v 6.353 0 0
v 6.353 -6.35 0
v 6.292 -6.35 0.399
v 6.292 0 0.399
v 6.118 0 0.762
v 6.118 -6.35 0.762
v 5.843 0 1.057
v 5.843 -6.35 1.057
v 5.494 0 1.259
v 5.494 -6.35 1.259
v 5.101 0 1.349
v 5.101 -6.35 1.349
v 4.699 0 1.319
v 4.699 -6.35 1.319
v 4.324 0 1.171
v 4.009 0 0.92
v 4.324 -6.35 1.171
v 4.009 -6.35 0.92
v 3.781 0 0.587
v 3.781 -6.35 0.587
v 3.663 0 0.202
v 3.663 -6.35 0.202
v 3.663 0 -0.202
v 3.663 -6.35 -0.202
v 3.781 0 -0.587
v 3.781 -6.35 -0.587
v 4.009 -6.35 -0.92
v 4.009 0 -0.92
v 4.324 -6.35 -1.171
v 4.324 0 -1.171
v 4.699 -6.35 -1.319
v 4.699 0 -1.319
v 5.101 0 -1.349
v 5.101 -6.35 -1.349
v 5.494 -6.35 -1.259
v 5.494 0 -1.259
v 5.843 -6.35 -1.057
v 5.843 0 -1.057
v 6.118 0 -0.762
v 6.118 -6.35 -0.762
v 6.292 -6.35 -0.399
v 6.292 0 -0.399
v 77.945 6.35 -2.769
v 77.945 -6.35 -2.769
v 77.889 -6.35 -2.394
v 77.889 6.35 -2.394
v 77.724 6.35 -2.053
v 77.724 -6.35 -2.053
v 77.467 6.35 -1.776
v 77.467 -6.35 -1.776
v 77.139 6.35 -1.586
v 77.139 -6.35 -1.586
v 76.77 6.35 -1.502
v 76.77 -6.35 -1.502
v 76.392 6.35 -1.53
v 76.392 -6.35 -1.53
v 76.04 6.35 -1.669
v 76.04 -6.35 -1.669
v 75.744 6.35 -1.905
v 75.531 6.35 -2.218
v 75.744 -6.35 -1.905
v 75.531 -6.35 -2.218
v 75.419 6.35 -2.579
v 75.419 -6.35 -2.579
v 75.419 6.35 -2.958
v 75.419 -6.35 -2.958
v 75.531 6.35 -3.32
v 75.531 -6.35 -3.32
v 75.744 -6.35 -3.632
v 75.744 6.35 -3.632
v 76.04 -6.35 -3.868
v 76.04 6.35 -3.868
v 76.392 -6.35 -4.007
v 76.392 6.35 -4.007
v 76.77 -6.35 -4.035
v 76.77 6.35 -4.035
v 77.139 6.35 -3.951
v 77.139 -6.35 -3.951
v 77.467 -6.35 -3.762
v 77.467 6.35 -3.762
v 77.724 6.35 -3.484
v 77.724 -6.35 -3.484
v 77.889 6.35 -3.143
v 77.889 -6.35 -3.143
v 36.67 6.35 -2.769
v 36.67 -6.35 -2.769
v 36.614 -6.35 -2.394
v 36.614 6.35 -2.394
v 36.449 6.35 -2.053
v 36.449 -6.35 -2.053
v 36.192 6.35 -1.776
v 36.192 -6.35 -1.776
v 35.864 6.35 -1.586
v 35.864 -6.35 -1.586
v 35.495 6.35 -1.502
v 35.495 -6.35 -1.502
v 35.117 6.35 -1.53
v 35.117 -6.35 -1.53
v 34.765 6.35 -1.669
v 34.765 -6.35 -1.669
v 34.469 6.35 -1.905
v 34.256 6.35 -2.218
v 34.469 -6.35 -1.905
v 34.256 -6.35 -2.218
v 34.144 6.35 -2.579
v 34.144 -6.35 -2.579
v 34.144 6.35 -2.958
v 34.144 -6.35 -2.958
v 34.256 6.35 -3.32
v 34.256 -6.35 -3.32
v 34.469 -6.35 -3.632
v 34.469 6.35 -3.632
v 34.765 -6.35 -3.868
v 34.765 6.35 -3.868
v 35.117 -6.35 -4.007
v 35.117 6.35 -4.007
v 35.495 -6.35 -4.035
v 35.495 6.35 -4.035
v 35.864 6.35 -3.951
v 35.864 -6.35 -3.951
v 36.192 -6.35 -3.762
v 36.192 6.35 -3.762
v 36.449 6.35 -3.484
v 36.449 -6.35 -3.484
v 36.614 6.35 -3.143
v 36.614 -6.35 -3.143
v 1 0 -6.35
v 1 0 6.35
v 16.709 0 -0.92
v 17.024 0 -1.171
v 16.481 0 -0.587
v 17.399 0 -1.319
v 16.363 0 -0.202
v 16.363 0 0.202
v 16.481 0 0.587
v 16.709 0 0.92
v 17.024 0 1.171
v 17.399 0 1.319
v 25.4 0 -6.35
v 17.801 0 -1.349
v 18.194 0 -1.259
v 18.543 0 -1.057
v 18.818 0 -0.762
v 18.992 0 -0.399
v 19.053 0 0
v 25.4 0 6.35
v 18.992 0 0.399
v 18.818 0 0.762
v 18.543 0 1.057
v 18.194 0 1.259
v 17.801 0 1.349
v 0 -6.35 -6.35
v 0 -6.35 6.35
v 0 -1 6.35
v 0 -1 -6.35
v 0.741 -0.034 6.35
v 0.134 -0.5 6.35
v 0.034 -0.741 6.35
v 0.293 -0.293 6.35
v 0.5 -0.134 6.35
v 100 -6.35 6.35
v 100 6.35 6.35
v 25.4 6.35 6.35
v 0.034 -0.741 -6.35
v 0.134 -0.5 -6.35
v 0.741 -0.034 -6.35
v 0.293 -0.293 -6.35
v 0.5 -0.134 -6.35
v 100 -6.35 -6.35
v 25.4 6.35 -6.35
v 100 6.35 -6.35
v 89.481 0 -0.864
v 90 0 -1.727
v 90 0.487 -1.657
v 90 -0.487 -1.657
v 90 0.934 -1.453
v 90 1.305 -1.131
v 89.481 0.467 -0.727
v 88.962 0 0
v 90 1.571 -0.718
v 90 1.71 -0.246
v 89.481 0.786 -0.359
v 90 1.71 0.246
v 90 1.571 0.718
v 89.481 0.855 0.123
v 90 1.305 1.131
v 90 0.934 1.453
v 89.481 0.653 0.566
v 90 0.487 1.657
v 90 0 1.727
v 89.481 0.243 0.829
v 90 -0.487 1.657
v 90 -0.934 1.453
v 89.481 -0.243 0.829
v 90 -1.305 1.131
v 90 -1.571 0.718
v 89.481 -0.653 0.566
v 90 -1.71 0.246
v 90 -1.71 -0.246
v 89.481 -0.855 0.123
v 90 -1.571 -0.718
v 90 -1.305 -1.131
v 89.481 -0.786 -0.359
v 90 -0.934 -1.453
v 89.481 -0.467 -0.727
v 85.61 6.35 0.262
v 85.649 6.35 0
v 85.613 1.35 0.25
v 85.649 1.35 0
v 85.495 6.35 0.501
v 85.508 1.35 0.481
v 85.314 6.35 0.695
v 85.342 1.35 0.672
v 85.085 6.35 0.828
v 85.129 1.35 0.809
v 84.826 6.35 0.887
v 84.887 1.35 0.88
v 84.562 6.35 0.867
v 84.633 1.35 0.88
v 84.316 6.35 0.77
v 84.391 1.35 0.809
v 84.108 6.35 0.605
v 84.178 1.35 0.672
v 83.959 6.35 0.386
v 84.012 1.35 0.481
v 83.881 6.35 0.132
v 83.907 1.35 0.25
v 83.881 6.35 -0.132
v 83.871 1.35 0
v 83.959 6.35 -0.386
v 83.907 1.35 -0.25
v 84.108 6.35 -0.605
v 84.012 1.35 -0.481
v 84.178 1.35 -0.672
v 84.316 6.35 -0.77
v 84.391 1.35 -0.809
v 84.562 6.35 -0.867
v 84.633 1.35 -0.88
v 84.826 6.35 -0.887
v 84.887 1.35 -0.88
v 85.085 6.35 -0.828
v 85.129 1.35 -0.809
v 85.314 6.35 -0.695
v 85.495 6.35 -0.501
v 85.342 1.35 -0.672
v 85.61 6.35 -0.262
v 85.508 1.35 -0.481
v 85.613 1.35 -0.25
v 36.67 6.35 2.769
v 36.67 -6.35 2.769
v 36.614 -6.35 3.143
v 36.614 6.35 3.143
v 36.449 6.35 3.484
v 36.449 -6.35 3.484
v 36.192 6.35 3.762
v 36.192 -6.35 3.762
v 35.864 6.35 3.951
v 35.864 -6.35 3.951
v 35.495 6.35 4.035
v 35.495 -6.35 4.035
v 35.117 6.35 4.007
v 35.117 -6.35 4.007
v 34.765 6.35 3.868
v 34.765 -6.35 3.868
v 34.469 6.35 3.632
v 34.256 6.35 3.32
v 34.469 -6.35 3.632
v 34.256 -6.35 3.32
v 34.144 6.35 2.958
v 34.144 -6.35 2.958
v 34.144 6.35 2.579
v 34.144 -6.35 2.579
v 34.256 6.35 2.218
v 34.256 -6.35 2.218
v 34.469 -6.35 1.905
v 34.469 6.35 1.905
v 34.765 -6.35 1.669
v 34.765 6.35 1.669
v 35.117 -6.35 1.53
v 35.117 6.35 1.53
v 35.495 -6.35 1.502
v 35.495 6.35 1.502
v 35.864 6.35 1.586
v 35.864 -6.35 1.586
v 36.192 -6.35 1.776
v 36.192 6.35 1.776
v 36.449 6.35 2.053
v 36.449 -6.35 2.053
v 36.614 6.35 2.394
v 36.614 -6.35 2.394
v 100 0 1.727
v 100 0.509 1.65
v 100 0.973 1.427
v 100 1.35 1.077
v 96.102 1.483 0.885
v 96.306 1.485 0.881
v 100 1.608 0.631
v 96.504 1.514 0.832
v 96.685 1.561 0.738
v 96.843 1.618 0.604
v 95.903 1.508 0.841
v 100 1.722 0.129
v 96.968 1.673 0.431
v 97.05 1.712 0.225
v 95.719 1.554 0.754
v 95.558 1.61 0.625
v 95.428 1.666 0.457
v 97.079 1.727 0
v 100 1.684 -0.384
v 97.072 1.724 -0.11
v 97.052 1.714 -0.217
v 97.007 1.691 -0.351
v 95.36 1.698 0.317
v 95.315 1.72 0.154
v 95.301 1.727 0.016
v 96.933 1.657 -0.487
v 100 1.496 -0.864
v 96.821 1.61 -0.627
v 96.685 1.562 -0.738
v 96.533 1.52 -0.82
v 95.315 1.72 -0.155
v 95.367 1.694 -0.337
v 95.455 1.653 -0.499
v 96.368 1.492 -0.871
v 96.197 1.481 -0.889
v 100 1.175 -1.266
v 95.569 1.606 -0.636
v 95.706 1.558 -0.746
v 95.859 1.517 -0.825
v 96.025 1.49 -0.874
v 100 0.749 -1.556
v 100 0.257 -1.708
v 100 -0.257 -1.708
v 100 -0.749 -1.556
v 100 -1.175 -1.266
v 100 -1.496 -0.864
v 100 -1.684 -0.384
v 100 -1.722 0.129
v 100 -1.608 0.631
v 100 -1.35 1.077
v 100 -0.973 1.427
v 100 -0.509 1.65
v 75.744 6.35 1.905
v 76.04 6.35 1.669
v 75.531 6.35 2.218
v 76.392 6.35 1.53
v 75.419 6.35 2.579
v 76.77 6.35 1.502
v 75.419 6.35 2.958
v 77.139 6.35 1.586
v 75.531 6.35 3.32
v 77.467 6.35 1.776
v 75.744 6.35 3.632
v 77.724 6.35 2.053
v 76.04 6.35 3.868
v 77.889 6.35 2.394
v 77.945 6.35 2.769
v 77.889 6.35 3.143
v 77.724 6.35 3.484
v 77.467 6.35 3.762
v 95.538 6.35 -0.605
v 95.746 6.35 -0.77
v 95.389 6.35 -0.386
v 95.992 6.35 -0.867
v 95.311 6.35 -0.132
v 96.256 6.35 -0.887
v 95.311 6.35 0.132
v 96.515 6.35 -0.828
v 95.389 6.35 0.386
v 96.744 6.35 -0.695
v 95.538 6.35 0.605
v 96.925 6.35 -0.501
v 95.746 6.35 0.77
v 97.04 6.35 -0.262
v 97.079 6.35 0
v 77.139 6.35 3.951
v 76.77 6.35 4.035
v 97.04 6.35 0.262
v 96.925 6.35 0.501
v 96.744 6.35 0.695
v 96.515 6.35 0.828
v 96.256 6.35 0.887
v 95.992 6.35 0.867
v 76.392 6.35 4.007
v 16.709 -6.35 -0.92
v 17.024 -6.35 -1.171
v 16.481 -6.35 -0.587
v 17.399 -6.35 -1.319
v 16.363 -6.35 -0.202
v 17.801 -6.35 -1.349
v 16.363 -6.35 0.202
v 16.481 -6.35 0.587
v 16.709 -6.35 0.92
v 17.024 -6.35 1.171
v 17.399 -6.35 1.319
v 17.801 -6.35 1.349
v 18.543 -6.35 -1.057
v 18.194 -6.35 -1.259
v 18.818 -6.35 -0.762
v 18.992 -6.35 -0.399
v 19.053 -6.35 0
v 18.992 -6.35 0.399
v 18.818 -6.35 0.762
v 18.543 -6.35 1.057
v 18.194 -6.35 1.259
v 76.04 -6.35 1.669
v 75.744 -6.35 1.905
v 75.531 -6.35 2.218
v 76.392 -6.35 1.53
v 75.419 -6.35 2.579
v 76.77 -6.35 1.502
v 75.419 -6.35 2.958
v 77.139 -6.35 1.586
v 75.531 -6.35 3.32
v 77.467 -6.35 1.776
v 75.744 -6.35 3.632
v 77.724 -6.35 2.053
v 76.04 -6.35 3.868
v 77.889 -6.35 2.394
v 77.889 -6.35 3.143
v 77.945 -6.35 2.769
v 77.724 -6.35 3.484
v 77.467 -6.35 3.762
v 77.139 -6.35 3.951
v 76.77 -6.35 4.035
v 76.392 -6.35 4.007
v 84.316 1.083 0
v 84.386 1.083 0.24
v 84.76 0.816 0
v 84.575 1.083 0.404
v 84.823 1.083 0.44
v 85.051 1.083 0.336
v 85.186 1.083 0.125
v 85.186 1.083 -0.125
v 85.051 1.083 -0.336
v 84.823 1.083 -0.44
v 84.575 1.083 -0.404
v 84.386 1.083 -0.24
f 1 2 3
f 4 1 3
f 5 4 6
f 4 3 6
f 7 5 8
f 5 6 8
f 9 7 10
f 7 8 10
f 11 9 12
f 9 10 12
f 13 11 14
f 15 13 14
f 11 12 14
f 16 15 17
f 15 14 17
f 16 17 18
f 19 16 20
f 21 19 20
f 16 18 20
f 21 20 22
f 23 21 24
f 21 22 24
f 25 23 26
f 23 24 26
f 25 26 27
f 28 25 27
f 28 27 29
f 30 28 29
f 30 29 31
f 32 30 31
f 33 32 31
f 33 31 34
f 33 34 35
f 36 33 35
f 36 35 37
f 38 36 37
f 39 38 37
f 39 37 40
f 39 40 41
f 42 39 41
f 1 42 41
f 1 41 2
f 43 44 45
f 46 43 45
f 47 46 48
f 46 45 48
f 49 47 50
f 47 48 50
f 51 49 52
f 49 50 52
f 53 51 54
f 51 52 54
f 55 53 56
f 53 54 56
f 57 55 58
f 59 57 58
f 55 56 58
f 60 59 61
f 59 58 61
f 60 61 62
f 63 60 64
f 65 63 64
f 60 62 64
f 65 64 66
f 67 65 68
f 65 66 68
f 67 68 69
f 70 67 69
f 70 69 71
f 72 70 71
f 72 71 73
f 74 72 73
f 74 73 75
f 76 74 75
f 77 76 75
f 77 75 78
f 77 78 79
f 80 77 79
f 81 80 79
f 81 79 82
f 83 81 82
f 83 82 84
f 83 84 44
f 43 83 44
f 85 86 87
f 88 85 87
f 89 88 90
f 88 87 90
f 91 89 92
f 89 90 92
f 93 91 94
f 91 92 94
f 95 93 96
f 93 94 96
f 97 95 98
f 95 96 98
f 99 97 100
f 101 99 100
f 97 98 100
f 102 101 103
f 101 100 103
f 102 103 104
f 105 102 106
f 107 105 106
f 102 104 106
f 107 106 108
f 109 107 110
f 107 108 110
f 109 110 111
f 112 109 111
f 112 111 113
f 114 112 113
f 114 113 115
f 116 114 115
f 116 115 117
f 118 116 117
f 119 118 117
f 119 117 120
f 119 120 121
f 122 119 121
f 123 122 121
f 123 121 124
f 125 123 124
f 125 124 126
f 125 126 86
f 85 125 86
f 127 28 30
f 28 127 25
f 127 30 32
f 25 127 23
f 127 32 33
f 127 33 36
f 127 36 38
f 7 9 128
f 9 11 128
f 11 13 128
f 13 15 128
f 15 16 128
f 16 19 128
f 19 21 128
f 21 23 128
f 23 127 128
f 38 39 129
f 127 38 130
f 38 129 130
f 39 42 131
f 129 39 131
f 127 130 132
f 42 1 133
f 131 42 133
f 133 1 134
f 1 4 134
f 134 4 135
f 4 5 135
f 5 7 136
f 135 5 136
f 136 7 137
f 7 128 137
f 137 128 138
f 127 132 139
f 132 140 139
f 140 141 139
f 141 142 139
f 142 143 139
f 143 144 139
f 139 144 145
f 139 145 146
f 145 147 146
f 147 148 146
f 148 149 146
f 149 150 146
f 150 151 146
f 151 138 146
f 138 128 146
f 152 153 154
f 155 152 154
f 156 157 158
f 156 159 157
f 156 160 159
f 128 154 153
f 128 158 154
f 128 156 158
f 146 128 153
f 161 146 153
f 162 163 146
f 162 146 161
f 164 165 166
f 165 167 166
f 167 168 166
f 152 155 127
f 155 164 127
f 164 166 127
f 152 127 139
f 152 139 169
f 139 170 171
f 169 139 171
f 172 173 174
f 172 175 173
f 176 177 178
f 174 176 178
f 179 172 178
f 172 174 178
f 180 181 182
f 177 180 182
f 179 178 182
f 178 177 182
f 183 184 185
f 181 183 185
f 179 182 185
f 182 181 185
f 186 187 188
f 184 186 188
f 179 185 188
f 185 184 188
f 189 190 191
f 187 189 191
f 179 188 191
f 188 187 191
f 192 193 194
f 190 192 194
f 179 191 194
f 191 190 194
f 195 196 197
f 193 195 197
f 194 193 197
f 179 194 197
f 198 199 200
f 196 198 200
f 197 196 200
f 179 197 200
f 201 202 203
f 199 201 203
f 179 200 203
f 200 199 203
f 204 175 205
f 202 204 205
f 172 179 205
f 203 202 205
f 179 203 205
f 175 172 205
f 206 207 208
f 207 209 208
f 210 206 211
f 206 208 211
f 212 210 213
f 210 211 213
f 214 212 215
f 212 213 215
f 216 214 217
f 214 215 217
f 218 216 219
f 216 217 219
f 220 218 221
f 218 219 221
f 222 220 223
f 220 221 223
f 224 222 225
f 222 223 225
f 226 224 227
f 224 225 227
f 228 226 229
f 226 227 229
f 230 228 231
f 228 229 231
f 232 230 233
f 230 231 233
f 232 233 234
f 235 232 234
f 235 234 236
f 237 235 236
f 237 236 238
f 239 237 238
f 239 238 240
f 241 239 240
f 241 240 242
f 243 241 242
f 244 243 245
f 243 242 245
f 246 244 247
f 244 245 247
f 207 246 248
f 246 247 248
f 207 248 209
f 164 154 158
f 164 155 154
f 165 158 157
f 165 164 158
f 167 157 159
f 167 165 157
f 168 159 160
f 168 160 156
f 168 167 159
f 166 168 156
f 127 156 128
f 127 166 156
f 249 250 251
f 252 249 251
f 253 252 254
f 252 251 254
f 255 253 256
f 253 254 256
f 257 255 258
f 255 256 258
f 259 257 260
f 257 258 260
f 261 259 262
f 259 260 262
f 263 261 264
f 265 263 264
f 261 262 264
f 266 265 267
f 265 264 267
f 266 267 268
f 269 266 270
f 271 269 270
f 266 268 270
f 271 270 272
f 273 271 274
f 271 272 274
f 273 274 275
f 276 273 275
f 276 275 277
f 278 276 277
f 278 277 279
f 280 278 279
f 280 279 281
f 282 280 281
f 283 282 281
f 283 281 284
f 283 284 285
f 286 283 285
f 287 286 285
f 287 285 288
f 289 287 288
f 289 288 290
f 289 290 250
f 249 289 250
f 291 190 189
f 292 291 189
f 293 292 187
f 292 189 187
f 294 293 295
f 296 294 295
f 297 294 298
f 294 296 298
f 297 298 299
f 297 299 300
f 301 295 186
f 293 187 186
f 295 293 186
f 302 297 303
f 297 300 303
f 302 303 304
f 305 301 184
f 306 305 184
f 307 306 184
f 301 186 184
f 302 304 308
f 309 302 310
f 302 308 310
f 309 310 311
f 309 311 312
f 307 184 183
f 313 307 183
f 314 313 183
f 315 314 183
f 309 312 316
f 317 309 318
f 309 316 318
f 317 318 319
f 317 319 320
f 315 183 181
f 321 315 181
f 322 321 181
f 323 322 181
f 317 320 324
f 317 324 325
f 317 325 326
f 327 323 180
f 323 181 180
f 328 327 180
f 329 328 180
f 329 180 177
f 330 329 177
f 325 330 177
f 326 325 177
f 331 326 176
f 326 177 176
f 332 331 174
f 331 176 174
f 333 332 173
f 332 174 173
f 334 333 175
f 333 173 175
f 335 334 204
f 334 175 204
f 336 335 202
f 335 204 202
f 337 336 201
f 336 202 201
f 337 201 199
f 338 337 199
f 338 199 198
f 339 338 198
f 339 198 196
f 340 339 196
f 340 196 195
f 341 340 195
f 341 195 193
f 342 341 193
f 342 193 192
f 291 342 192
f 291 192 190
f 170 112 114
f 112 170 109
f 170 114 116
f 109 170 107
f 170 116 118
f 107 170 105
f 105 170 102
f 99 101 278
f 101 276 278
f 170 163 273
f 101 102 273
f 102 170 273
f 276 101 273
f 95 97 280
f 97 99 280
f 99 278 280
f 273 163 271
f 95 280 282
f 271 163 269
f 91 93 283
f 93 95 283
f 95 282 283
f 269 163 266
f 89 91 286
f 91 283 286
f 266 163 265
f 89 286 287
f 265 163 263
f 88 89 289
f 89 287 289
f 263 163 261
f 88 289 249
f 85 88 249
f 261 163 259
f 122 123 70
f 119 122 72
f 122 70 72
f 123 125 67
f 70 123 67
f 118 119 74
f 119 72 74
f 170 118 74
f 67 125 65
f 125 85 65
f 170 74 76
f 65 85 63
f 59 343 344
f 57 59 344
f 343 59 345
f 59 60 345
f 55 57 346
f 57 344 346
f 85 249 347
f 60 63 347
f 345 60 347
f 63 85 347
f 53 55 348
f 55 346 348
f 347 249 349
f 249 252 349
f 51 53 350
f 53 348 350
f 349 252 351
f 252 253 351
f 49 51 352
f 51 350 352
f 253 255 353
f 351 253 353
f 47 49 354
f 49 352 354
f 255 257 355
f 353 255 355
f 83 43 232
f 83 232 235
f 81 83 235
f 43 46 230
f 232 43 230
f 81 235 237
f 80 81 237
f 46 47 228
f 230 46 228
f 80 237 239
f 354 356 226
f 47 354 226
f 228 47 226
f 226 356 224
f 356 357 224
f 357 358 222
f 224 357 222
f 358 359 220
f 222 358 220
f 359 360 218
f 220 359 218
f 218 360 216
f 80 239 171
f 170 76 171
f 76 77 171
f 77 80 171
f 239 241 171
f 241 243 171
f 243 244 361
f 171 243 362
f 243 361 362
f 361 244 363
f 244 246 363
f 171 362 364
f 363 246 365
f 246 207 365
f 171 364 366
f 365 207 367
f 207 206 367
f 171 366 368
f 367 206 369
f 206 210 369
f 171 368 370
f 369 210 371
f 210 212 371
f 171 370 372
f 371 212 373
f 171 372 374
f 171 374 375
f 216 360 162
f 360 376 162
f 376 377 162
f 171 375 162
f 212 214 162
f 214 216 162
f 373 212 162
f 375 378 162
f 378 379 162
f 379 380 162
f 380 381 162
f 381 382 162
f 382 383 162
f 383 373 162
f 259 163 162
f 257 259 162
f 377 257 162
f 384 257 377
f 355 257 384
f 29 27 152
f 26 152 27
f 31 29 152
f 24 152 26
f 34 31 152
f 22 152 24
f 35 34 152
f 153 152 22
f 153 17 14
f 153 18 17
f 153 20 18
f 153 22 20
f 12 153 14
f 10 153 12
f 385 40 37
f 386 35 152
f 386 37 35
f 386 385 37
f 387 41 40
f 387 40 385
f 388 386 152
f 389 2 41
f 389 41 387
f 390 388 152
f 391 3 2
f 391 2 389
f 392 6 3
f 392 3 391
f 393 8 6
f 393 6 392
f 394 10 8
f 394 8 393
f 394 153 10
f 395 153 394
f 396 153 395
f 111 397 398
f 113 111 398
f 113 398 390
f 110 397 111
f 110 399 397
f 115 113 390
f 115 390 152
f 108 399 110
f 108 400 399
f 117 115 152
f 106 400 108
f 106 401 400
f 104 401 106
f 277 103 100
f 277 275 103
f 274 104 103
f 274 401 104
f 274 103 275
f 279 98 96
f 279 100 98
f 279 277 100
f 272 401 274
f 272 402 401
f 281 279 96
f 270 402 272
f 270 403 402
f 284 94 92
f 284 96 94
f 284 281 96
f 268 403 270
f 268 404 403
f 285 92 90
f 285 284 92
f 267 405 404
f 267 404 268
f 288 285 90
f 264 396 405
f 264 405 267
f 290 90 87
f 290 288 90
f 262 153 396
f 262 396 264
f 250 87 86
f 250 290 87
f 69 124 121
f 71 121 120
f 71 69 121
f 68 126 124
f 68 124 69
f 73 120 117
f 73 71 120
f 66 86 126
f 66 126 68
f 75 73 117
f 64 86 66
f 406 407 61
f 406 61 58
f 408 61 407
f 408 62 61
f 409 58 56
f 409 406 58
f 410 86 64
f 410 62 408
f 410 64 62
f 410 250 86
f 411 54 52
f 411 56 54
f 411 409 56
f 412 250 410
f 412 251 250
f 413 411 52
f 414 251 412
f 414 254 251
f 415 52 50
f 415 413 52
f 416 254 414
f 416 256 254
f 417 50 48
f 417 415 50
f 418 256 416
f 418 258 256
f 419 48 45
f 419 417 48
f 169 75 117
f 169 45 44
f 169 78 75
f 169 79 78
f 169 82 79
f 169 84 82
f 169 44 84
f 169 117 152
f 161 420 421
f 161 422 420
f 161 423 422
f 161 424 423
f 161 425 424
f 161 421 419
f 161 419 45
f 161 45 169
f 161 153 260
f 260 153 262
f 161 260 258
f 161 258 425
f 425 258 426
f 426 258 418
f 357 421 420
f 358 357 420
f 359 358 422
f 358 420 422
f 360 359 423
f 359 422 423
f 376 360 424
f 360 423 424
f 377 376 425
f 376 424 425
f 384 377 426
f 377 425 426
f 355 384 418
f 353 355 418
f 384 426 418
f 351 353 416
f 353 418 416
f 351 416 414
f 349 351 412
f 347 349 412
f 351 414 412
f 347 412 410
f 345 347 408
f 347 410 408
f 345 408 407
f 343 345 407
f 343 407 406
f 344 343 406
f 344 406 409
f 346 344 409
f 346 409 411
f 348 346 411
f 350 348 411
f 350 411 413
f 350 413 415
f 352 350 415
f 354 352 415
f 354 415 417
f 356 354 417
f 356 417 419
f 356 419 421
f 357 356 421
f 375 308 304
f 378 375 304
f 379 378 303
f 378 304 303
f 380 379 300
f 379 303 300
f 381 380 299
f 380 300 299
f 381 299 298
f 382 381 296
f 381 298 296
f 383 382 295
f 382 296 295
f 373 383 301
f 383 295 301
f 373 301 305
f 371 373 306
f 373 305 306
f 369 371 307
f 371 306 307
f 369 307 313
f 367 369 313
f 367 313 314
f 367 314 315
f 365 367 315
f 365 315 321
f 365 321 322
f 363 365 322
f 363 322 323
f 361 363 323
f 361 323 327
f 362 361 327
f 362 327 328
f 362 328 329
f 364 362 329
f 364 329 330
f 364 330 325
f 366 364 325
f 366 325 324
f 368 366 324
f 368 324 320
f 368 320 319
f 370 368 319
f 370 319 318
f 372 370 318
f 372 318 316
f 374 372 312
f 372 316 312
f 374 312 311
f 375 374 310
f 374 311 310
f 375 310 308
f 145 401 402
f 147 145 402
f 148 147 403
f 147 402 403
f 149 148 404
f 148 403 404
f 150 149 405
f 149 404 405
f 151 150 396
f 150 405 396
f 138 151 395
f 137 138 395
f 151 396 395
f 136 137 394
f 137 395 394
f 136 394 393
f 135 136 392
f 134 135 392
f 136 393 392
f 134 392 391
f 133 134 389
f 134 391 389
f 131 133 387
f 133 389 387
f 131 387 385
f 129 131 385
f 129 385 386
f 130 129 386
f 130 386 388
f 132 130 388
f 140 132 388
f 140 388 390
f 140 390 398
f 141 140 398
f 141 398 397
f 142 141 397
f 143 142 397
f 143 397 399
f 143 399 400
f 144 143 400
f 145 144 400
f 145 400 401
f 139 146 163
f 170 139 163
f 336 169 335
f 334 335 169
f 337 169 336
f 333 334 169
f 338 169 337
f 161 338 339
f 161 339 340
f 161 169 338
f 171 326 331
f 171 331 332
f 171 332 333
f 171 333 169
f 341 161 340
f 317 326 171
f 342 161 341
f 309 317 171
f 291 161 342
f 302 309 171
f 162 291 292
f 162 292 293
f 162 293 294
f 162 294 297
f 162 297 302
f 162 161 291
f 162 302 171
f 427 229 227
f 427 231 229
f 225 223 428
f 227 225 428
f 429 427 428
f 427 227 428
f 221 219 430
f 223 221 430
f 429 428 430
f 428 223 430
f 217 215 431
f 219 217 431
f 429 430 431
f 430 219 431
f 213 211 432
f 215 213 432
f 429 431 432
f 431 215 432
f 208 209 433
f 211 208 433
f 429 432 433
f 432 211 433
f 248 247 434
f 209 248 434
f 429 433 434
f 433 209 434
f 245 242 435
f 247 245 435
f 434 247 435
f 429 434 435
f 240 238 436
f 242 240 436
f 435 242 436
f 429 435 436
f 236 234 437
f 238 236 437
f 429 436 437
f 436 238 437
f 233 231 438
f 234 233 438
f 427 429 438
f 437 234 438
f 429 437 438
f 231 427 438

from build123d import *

# Parameters (mm, degrees)
SKETCH1_W                  = 100
SKETCH1_H                  = 12.7
BOSS_EXTRUDE1_DEPTH        = 6.35
SKETCH2_W                  = 25.4
SKETCH2_H                  = 6.35
CUT_EXTRUDE1_DEPTH         = 13.7
F_6_32_TAPPED_HOLE1_D      = 2.7051
F_8_32_TAPPED_HOLE1_D      = 3.4544
F_8_32_TAPPED_HOLE1_DEPTH  = 10
F_8_32_TAPPED_HOLE1_TIP    = 1.037806461
F_2_0_221_DIAMETER_HOLE1_D = 2.54
F_2_56_TAPPED_HOLE2_D      = 1.778
F_2_56_TAPPED_HOLE2_DEPTH  = 5
F_2_56_TAPPED_HOLE2_TIP    = 0.53416509
FILLET2_R                  = 1


with BuildPart() as part:
    # Sketch1 → Boss-Extrude1 (new body, symmetric)
    with BuildSketch(Plane.XY):
        with Locations((50, 0)):
            Rectangle(SKETCH1_W, SKETCH1_H)
    extrude(amount=BOSS_EXTRUDE1_DEPTH, both=True)

    # Sketch2 → Cut-Extrude1 (cut, through all)
    with BuildSketch(Plane.XY.offset(6.35)):
        with Locations((12.7, 3.175)):
            Rectangle(SKETCH2_W, SKETCH2_H)
    extrude(amount=-CUT_EXTRUDE1_DEPTH, mode=Mode.SUBTRACT)

    # #6-32 Tapped Hole1 (through all)
    with Locations(Plane(origin=(0, 0, 0), x_dir=(-1, 0, 0), z_dir=(0, 1, 0))):
        with Locations((-17.7, 0), (-5, 0)):
            Hole(F_6_32_TAPPED_HOLE1_D / 2)

    # #8-32 Tapped Hole1
    with Locations(Plane(origin=(100, 0, 0), x_dir=(0, 0, -1), z_dir=(1, 0, 0))):
        with Locations((0, 0)):
            Hole(F_8_32_TAPPED_HOLE1_D / 2, depth=F_8_32_TAPPED_HOLE1_DEPTH)
            with Locations((0, 0, -(F_8_32_TAPPED_HOLE1_DEPTH + F_8_32_TAPPED_HOLE1_TIP / 2))):  # 118° drill point
                Cone(0, F_8_32_TAPPED_HOLE1_D / 2, F_8_32_TAPPED_HOLE1_TIP, mode=Mode.SUBTRACT)

    # #2 (0.221) Diameter Hole1 (through all)
    with Locations(Plane(origin=(0, 6.35, 0), x_dir=(-1, 0, 0), z_dir=(0, 1, 0))):
        with Locations((-35.4, -2.7686), (-76.675, -2.7686), (-76.675, 2.7686), (-35.4, 2.7686)):
            Hole(F_2_0_221_DIAMETER_HOLE1_D / 2)

    # #2-56 Tapped Hole2
    with Locations(Plane(origin=(0, 6.35, 0), x_dir=(-1, 0, 0), z_dir=(0, 1, 0))):
        with Locations((-84.76, 0), (-96.19, 0)):
            Hole(F_2_56_TAPPED_HOLE2_D / 2, depth=F_2_56_TAPPED_HOLE2_DEPTH)
            with Locations((0, 0, -(F_2_56_TAPPED_HOLE2_DEPTH + F_2_56_TAPPED_HOLE2_TIP / 2))):  # 118° drill point
                Cone(0, F_2_56_TAPPED_HOLE2_D / 2, F_2_56_TAPPED_HOLE2_TIP, mode=Mode.SUBTRACT)

    # Fillet2
    fillet2_edges = [part.edges().sort_by_distance(p)[0] for p in [
        (0, 0, 0),
    ]]
    fillet(fillet2_edges, radius=FILLET2_R)


solid = part.part
